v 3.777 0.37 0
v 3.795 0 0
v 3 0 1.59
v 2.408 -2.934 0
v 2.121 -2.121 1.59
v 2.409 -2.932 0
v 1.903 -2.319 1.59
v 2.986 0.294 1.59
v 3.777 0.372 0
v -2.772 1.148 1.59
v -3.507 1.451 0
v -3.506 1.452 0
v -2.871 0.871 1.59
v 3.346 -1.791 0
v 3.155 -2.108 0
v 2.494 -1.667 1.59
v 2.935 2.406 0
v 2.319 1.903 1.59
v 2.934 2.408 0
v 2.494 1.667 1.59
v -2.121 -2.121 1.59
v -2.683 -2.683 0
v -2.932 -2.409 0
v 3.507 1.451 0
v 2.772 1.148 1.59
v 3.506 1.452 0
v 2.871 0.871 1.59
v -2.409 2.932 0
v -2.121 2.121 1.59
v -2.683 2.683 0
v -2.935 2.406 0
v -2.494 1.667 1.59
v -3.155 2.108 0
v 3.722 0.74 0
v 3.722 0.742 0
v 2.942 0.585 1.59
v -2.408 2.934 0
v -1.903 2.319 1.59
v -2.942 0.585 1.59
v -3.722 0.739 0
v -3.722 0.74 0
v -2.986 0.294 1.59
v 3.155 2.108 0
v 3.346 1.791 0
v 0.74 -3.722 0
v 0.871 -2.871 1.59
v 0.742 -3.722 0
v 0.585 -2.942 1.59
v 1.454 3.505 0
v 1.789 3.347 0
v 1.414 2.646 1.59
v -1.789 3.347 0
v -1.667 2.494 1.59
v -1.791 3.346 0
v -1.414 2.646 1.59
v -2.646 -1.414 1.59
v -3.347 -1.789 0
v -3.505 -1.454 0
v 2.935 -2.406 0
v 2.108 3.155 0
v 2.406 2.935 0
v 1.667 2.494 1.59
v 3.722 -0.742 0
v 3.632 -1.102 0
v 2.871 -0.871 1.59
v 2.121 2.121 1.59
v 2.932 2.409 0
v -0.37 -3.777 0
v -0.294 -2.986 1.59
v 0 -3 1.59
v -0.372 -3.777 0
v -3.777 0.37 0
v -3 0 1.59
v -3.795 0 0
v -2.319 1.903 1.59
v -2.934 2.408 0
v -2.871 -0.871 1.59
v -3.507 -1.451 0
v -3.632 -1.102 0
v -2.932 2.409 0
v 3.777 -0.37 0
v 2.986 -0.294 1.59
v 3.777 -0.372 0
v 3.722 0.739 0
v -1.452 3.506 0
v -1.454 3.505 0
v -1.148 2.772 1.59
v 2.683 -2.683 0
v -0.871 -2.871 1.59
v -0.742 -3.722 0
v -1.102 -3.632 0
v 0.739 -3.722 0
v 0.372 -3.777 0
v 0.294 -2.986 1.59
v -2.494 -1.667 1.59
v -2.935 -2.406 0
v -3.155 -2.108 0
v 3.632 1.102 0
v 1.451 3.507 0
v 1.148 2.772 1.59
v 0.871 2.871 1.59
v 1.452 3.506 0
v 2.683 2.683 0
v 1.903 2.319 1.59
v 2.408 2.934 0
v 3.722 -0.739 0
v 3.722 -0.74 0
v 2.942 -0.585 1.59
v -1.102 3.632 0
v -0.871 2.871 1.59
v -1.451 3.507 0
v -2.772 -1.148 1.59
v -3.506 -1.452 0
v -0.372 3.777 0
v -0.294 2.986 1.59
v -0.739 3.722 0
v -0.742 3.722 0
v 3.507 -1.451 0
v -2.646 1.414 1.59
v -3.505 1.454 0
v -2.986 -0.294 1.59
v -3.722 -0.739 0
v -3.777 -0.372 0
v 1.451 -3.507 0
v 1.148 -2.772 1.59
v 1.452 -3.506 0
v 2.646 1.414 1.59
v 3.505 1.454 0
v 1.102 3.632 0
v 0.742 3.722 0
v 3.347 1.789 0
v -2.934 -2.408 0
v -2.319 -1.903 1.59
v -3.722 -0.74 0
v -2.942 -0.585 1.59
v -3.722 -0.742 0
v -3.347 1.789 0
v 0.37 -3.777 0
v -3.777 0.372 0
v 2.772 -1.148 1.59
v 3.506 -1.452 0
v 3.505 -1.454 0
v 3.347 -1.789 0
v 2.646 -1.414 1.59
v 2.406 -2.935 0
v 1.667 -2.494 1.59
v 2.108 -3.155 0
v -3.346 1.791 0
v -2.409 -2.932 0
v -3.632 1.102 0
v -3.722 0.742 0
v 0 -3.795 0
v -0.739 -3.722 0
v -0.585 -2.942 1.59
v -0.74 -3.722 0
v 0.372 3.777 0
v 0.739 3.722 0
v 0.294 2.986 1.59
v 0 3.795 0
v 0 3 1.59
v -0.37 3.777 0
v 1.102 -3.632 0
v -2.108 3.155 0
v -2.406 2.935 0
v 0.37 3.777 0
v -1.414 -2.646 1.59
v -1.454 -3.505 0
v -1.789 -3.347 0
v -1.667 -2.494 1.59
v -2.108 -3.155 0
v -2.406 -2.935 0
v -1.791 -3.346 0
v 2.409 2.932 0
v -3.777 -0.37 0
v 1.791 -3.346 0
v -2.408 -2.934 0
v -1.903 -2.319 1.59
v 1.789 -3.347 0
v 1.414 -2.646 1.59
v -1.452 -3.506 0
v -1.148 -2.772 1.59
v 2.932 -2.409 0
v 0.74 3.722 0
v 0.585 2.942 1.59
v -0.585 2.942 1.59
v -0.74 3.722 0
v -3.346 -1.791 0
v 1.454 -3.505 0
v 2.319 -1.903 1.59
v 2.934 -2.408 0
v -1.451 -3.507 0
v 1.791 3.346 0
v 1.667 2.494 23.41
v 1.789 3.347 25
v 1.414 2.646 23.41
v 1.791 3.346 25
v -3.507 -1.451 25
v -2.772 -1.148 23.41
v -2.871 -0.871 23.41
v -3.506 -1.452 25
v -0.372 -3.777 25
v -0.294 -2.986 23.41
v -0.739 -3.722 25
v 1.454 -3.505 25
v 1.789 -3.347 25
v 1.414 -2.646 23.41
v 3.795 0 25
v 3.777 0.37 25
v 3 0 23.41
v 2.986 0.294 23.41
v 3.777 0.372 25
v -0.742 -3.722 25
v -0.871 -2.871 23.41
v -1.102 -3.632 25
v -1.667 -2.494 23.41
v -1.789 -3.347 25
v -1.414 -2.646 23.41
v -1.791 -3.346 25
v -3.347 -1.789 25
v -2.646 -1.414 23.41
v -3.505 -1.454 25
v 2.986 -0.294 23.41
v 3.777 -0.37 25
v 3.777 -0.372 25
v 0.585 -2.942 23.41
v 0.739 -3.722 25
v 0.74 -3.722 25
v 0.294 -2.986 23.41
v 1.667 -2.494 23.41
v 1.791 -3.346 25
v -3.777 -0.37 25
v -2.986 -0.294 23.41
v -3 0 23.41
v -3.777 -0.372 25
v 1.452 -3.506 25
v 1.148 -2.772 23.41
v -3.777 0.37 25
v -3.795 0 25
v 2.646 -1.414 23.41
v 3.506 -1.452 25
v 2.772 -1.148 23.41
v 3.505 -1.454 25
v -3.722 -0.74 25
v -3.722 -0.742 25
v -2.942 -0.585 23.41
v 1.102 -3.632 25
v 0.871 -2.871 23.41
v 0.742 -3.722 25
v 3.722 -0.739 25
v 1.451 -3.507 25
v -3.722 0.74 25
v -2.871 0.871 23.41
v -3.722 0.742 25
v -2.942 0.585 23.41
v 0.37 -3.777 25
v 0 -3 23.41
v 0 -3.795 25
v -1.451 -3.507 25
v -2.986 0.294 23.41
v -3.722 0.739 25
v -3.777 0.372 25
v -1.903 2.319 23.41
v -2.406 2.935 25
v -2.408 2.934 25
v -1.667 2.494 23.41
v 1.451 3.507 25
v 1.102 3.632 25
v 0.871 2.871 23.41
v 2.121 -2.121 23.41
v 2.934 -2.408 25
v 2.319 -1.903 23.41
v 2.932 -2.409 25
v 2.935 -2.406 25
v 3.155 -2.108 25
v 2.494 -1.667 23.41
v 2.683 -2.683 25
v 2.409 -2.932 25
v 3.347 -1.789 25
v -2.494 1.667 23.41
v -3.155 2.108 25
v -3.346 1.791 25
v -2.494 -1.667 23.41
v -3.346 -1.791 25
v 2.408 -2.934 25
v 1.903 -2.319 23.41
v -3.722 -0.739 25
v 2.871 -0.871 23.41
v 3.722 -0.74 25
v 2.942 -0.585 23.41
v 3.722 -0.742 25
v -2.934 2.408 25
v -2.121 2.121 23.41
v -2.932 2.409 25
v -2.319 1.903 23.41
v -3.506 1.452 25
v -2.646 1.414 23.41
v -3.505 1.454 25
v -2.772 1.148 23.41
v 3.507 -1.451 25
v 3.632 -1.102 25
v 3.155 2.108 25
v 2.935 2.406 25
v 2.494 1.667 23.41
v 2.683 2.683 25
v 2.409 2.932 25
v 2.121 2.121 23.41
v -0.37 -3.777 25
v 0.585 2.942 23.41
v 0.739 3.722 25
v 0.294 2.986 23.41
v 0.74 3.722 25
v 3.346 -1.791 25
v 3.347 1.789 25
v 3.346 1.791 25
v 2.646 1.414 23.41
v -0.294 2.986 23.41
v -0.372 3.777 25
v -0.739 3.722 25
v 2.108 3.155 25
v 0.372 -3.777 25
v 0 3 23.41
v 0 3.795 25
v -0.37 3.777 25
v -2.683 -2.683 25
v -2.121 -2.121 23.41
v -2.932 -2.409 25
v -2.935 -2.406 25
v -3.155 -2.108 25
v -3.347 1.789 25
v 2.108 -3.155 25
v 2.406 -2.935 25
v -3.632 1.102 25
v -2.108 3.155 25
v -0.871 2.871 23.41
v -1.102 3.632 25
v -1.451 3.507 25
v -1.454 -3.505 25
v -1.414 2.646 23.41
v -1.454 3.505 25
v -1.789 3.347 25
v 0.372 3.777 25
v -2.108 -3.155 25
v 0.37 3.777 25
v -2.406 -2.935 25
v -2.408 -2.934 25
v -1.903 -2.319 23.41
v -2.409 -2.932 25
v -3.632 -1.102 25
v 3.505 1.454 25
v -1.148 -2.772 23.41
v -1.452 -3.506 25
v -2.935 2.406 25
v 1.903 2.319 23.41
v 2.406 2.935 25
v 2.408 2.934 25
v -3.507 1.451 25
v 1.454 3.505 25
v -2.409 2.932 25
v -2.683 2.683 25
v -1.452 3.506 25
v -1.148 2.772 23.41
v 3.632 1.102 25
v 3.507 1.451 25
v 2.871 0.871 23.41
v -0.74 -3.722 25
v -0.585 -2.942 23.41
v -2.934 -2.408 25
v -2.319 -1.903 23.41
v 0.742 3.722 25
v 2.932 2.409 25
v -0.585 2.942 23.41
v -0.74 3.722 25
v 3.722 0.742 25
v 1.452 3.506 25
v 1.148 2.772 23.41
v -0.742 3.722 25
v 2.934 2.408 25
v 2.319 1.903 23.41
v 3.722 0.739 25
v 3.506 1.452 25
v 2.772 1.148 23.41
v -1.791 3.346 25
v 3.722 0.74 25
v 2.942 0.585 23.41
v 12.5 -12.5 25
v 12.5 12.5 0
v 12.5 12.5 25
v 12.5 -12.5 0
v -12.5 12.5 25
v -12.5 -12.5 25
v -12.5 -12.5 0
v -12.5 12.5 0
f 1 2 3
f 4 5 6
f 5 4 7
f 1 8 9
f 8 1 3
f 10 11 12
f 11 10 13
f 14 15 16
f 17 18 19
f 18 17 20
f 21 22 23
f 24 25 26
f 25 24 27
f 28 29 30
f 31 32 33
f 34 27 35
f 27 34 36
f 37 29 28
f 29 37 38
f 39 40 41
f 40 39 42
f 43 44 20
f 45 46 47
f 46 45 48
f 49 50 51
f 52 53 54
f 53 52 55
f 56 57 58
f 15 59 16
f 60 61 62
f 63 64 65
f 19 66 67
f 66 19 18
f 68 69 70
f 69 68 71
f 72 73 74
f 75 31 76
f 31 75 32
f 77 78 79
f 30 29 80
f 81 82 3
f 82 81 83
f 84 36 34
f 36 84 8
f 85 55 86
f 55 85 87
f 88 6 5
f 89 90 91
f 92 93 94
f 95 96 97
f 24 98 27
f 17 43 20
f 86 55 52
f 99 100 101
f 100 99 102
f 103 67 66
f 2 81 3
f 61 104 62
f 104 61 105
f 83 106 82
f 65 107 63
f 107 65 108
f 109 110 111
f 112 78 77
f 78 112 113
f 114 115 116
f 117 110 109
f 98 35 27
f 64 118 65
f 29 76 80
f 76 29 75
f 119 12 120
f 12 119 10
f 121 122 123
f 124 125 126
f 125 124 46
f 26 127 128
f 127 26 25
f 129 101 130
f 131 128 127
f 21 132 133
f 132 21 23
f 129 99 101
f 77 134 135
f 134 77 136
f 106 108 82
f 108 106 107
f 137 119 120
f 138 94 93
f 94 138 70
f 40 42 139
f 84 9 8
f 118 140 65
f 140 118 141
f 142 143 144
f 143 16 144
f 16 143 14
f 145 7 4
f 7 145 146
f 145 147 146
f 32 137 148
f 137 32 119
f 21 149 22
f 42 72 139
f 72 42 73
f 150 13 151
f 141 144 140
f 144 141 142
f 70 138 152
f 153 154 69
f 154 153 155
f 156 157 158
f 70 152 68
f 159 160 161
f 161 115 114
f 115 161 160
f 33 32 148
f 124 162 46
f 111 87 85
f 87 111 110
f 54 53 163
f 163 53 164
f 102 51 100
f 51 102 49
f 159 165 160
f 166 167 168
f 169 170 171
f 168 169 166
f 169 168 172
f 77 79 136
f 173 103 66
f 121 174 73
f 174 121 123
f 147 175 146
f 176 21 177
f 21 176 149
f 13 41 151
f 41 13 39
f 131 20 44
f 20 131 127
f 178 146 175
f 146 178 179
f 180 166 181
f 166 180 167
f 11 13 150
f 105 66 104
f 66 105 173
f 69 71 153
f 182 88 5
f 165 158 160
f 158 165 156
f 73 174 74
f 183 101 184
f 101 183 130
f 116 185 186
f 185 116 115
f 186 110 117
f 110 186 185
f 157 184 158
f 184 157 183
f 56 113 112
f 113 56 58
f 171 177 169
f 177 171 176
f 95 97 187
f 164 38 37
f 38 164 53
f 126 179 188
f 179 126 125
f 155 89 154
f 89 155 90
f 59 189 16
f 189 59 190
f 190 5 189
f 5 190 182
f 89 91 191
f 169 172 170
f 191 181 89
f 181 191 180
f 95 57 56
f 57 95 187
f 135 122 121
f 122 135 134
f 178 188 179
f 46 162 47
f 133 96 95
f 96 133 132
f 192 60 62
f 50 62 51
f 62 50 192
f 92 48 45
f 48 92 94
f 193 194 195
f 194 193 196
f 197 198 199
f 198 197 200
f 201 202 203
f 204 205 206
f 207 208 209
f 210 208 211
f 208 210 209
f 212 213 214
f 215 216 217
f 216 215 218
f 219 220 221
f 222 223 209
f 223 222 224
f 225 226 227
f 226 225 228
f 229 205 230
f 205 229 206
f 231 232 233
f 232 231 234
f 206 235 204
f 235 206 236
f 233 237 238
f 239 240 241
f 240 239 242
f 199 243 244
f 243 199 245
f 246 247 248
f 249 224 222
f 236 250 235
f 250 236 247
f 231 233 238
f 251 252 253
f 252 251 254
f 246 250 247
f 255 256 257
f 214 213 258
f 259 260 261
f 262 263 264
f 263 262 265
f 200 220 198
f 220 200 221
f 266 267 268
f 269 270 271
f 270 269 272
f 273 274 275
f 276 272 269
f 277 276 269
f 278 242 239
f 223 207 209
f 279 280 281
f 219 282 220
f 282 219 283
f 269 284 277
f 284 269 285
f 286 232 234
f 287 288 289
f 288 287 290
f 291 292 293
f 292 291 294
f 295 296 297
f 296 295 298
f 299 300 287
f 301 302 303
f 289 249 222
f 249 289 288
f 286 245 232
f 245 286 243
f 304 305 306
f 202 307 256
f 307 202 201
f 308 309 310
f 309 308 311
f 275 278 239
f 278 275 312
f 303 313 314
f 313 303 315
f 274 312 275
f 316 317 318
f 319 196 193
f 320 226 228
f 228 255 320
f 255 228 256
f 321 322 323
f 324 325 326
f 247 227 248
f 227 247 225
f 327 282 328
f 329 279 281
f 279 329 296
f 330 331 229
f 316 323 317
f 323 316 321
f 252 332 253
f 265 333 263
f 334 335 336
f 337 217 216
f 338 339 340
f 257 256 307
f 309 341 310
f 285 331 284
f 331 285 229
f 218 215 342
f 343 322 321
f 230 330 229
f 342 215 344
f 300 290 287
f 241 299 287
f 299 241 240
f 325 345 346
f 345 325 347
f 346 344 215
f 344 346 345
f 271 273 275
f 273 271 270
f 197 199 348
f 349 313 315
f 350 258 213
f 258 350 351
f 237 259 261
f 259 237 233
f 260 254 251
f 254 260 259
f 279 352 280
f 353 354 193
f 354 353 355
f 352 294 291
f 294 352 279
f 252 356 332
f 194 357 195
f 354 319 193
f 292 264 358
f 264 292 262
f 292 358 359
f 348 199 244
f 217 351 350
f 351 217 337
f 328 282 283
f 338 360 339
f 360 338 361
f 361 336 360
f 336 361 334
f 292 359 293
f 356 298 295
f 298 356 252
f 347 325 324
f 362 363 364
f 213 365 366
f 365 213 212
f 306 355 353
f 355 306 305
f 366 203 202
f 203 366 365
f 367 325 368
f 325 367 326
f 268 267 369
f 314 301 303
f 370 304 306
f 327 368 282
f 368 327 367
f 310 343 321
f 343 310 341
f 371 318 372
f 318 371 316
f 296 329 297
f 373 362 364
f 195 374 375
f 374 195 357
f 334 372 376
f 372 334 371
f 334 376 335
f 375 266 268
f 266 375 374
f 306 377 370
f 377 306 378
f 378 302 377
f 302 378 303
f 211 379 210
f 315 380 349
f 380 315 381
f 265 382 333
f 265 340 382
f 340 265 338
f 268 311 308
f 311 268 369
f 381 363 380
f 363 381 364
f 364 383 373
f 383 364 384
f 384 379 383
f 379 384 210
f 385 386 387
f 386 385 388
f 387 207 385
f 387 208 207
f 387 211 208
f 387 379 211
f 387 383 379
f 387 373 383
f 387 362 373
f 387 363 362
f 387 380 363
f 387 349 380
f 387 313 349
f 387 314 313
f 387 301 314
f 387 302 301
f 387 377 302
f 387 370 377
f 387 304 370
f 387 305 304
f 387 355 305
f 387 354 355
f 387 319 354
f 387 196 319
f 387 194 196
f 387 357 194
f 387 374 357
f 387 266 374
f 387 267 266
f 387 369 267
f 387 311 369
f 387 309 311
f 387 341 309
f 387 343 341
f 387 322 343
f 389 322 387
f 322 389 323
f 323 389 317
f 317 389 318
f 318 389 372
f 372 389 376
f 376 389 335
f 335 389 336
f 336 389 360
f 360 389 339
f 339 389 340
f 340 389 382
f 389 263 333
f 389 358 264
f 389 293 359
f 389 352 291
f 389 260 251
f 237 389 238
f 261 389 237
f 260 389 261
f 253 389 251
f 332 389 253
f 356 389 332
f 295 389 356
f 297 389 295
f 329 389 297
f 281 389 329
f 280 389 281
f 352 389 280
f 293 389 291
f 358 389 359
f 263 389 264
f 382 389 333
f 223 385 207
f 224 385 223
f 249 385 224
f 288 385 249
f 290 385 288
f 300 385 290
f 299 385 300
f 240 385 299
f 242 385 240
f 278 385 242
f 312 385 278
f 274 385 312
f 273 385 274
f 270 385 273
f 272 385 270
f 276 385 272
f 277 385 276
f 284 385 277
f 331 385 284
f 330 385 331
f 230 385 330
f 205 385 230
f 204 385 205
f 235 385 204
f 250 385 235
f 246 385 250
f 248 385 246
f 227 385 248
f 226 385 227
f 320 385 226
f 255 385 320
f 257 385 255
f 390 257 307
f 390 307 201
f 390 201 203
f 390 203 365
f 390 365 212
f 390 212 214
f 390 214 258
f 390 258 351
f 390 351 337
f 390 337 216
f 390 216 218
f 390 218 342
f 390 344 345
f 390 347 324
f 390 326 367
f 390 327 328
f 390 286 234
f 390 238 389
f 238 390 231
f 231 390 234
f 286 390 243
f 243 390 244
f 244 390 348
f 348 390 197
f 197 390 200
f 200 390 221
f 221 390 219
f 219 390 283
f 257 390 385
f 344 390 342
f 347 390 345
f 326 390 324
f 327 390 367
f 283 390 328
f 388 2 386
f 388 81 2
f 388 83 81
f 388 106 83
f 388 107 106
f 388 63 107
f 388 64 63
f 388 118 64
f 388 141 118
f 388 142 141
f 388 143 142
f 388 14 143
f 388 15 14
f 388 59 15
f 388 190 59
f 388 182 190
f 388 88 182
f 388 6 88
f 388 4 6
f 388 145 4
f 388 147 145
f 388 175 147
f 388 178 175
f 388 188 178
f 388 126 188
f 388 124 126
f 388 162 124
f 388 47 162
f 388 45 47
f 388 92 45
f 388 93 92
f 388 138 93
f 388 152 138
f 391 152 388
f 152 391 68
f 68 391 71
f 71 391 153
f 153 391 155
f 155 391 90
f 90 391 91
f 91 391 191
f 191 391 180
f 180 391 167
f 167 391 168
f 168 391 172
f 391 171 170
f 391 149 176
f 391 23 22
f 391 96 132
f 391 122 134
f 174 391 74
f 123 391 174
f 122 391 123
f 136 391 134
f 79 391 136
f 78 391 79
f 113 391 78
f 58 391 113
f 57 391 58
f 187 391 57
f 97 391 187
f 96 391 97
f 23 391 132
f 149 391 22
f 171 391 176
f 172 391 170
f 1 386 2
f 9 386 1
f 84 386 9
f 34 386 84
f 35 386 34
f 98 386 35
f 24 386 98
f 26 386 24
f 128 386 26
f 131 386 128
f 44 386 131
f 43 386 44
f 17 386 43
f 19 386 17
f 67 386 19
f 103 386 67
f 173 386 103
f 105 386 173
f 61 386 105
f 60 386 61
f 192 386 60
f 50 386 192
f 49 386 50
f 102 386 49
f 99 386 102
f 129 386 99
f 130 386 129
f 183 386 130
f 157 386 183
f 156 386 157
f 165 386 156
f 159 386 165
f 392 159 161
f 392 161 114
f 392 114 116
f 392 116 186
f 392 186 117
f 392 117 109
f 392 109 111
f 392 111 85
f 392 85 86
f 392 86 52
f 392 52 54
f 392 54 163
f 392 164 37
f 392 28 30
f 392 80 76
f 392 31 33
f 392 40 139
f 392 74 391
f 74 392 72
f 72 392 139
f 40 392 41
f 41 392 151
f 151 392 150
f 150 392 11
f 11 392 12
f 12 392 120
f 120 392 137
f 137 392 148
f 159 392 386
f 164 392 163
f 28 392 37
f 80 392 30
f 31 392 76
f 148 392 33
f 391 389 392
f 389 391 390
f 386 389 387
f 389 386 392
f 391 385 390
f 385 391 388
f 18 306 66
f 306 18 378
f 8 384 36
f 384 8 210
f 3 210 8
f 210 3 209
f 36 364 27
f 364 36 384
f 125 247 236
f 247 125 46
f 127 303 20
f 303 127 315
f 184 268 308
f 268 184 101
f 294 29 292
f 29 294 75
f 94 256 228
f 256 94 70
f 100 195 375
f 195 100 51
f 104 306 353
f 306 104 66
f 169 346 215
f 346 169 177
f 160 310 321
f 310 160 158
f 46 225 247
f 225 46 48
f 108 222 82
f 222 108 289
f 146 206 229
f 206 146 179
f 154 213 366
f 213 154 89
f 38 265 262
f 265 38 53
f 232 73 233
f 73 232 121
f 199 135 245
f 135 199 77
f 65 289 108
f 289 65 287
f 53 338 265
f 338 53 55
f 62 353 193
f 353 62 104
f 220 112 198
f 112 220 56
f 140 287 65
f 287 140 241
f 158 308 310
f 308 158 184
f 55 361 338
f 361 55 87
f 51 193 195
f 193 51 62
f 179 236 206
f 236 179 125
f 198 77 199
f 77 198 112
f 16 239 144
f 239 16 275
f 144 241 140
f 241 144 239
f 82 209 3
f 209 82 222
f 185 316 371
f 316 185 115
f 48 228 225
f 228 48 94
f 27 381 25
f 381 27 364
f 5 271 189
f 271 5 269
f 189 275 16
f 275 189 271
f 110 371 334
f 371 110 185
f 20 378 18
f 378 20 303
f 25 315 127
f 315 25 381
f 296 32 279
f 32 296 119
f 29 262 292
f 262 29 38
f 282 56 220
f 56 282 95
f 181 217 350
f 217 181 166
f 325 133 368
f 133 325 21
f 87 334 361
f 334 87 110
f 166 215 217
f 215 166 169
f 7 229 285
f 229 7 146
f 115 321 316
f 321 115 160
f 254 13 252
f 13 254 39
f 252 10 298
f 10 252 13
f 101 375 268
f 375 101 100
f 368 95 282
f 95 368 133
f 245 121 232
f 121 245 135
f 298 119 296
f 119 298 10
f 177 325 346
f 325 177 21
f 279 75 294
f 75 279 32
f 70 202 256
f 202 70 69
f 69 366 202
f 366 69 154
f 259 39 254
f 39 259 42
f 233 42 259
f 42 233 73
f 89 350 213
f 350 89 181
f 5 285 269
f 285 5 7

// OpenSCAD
/* [Dimensions] */
// Cube side length
cube_size = 25; // [10:50]
// Through-hole diameter
hole_diameter = 6; // [2:0.5:20]

/* [Options] */
// Add chamfer to hole entry/exit
chamfer_hole = true;

// Derived values
hole_r = hole_diameter / 2;
chamfer_size = chamfer_hole ? 0.8 : 0;

$fn = 64;

difference() {
    // Main cube, centered then shifted to sit on XY plane
    translate([0, 0, cube_size / 2])
        cube([cube_size, cube_size, cube_size], center = true);
    
    // Through-hole along Z axis
    translate([0, 0, -0.5])
        cylinder(h = cube_size + 1, r = hole_r);
    
    // Chamfers at top and bottom of hole
    if (chamfer_hole) {
        translate([0, 0, -0.01])
            cylinder(h = chamfer_size * 2, r1 = hole_r + chamfer_size, r2 = hole_r);
        translate([0, 0, cube_size - chamfer_size * 2 + 0.01])
            cylinder(h = chamfer_size * 2, r1 = hole_r, r2 = hole_r + chamfer_size);
    }
}
